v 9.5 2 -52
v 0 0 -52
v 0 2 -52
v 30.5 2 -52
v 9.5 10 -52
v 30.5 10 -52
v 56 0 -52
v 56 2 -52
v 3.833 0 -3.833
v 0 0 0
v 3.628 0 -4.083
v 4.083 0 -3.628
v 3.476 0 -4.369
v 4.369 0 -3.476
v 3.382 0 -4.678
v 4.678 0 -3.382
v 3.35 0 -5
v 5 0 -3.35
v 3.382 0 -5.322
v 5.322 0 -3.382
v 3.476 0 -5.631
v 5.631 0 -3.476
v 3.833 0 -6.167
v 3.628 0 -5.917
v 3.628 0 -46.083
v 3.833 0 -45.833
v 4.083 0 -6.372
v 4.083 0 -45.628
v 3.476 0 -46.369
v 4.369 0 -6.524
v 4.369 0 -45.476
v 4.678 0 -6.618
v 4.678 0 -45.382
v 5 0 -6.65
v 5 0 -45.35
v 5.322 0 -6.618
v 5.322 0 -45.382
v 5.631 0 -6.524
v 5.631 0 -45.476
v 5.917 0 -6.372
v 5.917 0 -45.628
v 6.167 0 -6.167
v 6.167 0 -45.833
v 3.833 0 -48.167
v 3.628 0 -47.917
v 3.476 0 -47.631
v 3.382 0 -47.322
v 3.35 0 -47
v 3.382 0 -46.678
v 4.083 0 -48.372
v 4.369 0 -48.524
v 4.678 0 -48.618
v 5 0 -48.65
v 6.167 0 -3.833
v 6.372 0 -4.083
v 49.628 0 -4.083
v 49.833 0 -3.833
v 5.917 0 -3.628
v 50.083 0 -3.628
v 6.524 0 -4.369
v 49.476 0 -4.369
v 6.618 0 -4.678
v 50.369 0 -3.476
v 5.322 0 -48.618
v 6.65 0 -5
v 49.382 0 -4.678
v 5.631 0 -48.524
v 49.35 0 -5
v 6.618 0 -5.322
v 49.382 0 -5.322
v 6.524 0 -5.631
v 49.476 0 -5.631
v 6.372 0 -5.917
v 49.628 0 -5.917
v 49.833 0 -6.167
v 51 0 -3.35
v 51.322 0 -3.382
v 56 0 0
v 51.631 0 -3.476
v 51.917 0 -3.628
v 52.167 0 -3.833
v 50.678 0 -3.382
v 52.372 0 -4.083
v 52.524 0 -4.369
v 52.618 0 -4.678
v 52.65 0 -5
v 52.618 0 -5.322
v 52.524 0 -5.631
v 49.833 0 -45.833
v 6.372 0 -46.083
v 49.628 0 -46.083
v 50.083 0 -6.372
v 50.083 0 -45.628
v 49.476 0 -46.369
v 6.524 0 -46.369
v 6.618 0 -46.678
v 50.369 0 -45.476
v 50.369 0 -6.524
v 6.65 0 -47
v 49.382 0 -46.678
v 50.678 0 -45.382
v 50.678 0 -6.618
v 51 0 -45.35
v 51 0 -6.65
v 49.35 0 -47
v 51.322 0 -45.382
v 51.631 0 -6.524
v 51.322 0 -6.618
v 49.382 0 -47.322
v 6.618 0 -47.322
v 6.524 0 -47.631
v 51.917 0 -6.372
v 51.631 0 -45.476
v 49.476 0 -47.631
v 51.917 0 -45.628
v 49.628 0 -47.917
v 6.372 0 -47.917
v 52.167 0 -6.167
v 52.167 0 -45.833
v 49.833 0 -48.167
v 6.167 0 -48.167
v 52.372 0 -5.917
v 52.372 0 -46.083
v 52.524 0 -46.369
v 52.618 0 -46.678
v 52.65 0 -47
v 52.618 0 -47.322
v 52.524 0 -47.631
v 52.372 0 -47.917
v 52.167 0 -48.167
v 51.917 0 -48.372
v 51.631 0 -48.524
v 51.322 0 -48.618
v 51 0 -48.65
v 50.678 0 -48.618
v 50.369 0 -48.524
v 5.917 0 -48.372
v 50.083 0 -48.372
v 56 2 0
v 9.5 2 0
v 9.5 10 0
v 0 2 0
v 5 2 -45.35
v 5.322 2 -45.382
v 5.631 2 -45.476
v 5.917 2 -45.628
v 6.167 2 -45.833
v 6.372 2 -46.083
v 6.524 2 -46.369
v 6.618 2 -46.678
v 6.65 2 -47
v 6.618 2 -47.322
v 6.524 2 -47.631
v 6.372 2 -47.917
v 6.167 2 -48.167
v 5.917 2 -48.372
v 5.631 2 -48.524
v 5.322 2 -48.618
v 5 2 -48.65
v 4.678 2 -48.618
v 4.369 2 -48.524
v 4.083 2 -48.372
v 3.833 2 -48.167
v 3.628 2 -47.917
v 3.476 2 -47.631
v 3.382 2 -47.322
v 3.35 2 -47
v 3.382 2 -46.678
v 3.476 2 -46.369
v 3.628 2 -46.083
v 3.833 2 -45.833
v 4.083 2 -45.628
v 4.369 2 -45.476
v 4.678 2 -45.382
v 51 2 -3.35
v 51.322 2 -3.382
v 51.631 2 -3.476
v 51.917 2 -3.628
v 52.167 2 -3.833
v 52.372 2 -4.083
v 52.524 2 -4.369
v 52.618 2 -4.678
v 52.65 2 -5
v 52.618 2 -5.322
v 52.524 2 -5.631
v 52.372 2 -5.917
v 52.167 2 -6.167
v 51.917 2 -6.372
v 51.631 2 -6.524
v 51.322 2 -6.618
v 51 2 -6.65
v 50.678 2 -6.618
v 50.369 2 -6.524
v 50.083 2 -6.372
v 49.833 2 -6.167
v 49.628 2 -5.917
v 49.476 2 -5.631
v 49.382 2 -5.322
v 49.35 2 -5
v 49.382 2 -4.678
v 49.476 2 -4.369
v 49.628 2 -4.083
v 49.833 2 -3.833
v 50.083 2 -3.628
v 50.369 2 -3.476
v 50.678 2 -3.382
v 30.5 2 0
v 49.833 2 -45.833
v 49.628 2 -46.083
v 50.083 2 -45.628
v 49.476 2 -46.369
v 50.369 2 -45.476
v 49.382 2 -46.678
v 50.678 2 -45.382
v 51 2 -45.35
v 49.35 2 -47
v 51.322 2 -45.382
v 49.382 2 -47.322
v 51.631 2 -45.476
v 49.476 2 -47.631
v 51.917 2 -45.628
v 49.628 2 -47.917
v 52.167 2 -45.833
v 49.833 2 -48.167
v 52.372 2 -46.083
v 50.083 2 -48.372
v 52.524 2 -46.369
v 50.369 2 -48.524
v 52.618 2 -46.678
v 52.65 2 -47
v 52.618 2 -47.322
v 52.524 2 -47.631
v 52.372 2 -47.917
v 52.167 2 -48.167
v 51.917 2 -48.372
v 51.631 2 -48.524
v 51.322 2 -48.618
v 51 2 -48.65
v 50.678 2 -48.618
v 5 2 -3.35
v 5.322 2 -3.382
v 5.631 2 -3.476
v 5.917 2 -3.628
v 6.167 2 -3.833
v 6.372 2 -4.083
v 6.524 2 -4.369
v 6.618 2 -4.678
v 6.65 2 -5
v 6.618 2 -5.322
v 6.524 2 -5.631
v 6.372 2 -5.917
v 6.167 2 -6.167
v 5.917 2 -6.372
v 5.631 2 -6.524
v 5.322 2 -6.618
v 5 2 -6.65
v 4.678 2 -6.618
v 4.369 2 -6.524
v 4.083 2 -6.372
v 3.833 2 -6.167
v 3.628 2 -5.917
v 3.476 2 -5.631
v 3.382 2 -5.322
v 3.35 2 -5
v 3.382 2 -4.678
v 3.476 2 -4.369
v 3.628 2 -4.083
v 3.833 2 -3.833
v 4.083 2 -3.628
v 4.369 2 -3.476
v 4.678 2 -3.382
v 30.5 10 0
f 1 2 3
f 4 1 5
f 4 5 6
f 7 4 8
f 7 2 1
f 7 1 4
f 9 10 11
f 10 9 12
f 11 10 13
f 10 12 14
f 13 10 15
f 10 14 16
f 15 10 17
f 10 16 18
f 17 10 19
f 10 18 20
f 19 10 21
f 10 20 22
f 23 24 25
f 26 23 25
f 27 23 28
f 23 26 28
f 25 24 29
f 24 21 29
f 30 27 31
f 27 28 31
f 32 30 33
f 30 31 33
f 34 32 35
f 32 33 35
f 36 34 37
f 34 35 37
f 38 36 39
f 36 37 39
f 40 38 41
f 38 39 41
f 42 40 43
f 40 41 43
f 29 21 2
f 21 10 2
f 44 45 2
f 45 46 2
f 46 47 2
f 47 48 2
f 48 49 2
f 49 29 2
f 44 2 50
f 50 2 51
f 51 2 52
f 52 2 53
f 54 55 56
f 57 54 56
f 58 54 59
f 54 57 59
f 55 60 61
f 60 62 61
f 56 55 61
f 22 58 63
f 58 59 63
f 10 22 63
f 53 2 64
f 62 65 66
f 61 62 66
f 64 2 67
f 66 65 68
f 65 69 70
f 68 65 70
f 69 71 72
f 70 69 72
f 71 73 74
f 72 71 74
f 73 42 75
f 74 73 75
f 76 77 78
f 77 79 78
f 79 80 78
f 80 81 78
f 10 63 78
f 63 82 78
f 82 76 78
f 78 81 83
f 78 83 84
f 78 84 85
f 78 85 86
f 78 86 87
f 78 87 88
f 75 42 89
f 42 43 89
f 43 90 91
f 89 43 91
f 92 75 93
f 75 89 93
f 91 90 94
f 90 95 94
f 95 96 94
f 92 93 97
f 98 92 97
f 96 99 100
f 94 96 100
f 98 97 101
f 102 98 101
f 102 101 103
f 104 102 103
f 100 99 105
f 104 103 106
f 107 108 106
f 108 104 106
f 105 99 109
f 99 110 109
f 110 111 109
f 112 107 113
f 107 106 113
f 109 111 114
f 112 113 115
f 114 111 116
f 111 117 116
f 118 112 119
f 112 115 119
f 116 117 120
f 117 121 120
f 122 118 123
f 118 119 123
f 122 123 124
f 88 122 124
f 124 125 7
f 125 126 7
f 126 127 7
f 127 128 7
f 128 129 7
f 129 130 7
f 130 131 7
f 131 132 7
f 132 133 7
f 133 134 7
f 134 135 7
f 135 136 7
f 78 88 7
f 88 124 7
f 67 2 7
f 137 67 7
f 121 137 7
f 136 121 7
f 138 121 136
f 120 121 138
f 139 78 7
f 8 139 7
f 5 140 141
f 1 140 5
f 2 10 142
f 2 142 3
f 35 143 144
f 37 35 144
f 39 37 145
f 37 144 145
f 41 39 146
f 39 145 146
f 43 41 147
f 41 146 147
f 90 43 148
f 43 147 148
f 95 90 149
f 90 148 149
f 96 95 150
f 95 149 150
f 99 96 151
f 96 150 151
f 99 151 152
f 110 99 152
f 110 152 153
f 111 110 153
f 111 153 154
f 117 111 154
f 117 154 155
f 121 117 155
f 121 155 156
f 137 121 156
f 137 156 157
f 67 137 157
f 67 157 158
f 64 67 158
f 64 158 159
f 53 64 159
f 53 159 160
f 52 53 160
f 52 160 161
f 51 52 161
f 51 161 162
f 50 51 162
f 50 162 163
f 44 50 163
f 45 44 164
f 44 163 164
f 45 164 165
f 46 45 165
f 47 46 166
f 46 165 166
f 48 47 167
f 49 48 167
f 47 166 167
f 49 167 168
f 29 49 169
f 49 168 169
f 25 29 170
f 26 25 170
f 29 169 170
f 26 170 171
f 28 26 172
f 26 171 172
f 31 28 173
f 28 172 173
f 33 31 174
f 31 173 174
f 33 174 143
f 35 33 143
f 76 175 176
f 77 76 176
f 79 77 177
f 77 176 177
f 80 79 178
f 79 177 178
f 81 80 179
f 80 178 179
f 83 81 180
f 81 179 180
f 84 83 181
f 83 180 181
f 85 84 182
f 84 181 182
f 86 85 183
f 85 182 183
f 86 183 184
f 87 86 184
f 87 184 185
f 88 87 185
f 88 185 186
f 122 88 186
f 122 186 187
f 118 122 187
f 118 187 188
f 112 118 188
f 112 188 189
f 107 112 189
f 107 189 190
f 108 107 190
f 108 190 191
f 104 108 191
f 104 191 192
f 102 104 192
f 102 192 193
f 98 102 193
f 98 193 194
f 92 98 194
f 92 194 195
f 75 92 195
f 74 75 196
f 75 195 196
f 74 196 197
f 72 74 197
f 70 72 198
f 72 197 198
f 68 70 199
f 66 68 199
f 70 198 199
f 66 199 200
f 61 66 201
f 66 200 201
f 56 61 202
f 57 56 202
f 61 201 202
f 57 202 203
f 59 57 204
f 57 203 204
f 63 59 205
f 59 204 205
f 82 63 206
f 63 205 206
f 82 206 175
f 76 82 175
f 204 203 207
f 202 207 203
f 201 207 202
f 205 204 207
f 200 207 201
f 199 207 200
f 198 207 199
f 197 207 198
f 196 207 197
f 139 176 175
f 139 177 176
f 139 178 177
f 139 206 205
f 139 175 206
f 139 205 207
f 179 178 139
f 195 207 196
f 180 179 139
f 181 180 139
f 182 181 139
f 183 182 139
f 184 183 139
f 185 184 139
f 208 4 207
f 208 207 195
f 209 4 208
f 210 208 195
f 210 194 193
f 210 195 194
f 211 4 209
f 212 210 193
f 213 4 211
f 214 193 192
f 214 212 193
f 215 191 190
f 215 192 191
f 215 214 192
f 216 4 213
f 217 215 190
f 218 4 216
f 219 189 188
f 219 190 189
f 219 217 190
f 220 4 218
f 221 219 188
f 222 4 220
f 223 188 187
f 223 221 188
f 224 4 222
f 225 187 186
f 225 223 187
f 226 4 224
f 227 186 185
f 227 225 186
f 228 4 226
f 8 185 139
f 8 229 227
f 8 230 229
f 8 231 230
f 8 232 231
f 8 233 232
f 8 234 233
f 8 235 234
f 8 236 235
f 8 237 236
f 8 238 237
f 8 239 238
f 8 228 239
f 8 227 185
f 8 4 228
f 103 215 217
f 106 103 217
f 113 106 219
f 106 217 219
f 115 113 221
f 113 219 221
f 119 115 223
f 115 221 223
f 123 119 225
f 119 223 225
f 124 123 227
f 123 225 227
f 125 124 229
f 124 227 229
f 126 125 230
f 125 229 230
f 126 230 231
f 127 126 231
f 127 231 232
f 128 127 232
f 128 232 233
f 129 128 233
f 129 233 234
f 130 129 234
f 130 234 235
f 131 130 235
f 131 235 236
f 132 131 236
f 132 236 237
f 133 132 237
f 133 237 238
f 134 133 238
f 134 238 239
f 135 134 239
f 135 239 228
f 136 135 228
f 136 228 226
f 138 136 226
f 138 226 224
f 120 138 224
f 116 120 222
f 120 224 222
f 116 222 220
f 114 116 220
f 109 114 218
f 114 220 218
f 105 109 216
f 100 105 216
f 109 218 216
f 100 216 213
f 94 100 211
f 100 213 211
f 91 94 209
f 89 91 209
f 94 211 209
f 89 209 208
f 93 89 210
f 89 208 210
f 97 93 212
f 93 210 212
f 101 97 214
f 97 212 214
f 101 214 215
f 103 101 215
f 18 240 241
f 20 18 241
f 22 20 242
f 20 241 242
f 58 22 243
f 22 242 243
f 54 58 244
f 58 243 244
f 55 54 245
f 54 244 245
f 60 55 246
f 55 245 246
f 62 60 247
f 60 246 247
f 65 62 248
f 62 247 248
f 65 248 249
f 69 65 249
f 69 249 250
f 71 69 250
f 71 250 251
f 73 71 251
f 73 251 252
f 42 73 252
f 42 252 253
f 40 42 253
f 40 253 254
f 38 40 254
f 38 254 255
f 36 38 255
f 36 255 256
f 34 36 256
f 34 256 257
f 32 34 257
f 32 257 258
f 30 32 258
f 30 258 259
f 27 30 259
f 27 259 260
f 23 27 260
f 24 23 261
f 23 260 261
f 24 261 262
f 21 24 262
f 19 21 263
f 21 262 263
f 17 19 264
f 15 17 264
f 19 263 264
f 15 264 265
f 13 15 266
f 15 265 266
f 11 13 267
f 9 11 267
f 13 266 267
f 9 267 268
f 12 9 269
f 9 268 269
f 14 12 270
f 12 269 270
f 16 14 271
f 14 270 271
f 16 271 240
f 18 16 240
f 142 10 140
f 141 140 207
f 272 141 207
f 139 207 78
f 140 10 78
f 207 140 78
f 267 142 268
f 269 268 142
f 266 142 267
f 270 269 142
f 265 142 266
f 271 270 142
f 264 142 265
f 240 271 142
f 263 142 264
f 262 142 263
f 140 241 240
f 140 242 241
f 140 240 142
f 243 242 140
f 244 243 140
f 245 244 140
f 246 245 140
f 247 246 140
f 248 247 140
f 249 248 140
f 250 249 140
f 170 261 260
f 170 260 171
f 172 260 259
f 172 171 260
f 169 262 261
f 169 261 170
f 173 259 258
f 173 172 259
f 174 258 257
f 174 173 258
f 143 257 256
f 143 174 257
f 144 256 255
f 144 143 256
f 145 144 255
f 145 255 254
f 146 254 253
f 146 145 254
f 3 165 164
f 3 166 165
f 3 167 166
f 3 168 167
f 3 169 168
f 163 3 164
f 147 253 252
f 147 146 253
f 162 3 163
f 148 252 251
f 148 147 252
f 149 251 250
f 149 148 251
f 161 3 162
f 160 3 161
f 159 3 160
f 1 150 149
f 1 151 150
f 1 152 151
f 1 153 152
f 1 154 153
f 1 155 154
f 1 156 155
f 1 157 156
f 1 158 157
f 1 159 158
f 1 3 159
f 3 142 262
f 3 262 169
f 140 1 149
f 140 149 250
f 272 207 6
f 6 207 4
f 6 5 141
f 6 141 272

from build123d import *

# Parameters (mm, degrees)
SKETCH2_W           = 56
SKETCH2_H           = 52
BOSS_EXTRUDE1_DEPTH = 2
SKETCH3_R           = 1.65
CUT_EXTRUDE1_DEPTH  = 77.446059414
SKETCH4_W           = 21
SKETCH4_H           = 52
BOSS_EXTRUDE2_DEPTH = 8


with BuildPart() as part:
    # Sketch2 → Boss-Extrude1 (new body)
    with BuildSketch(Plane(origin=(0, 0, 0), x_dir=(1, 0, 0), z_dir=(0, 1, 0))):
        with Locations((28, 26)):
            Rectangle(SKETCH2_W, SKETCH2_H)
    extrude(amount=BOSS_EXTRUDE1_DEPTH)

    # Sketch3 → Cut-Extrude1 (cut, through all)
    with BuildSketch(Plane(origin=(0, 2, 0), x_dir=(1, 0, 0), z_dir=(0, 1, 0))):
        with Locations(Location((5, 47, 0), (0, 0, 270))):
            Circle(SKETCH3_R)
        with Locations(Location((51, 47, 0), (0, 0, 270))):
            Circle(SKETCH3_R)
        with Locations(Location((5, 5, 0), (0, 0, 270))):
            Circle(SKETCH3_R)
        with Locations(Location((51, 5, 0), (0, 0, 270))):
            Circle(SKETCH3_R)
    extrude(amount=-CUT_EXTRUDE1_DEPTH, mode=Mode.SUBTRACT)

    # Sketch4 → Boss-Extrude2 (add)
    with BuildSketch(Plane(origin=(0, 2, 0), x_dir=(1, 0, 0), z_dir=(0, 1, 0))):
        with Locations((20, 26)):
            Rectangle(SKETCH4_W, SKETCH4_H)
    extrude(amount=BOSS_EXTRUDE2_DEPTH)


solid = part.part
